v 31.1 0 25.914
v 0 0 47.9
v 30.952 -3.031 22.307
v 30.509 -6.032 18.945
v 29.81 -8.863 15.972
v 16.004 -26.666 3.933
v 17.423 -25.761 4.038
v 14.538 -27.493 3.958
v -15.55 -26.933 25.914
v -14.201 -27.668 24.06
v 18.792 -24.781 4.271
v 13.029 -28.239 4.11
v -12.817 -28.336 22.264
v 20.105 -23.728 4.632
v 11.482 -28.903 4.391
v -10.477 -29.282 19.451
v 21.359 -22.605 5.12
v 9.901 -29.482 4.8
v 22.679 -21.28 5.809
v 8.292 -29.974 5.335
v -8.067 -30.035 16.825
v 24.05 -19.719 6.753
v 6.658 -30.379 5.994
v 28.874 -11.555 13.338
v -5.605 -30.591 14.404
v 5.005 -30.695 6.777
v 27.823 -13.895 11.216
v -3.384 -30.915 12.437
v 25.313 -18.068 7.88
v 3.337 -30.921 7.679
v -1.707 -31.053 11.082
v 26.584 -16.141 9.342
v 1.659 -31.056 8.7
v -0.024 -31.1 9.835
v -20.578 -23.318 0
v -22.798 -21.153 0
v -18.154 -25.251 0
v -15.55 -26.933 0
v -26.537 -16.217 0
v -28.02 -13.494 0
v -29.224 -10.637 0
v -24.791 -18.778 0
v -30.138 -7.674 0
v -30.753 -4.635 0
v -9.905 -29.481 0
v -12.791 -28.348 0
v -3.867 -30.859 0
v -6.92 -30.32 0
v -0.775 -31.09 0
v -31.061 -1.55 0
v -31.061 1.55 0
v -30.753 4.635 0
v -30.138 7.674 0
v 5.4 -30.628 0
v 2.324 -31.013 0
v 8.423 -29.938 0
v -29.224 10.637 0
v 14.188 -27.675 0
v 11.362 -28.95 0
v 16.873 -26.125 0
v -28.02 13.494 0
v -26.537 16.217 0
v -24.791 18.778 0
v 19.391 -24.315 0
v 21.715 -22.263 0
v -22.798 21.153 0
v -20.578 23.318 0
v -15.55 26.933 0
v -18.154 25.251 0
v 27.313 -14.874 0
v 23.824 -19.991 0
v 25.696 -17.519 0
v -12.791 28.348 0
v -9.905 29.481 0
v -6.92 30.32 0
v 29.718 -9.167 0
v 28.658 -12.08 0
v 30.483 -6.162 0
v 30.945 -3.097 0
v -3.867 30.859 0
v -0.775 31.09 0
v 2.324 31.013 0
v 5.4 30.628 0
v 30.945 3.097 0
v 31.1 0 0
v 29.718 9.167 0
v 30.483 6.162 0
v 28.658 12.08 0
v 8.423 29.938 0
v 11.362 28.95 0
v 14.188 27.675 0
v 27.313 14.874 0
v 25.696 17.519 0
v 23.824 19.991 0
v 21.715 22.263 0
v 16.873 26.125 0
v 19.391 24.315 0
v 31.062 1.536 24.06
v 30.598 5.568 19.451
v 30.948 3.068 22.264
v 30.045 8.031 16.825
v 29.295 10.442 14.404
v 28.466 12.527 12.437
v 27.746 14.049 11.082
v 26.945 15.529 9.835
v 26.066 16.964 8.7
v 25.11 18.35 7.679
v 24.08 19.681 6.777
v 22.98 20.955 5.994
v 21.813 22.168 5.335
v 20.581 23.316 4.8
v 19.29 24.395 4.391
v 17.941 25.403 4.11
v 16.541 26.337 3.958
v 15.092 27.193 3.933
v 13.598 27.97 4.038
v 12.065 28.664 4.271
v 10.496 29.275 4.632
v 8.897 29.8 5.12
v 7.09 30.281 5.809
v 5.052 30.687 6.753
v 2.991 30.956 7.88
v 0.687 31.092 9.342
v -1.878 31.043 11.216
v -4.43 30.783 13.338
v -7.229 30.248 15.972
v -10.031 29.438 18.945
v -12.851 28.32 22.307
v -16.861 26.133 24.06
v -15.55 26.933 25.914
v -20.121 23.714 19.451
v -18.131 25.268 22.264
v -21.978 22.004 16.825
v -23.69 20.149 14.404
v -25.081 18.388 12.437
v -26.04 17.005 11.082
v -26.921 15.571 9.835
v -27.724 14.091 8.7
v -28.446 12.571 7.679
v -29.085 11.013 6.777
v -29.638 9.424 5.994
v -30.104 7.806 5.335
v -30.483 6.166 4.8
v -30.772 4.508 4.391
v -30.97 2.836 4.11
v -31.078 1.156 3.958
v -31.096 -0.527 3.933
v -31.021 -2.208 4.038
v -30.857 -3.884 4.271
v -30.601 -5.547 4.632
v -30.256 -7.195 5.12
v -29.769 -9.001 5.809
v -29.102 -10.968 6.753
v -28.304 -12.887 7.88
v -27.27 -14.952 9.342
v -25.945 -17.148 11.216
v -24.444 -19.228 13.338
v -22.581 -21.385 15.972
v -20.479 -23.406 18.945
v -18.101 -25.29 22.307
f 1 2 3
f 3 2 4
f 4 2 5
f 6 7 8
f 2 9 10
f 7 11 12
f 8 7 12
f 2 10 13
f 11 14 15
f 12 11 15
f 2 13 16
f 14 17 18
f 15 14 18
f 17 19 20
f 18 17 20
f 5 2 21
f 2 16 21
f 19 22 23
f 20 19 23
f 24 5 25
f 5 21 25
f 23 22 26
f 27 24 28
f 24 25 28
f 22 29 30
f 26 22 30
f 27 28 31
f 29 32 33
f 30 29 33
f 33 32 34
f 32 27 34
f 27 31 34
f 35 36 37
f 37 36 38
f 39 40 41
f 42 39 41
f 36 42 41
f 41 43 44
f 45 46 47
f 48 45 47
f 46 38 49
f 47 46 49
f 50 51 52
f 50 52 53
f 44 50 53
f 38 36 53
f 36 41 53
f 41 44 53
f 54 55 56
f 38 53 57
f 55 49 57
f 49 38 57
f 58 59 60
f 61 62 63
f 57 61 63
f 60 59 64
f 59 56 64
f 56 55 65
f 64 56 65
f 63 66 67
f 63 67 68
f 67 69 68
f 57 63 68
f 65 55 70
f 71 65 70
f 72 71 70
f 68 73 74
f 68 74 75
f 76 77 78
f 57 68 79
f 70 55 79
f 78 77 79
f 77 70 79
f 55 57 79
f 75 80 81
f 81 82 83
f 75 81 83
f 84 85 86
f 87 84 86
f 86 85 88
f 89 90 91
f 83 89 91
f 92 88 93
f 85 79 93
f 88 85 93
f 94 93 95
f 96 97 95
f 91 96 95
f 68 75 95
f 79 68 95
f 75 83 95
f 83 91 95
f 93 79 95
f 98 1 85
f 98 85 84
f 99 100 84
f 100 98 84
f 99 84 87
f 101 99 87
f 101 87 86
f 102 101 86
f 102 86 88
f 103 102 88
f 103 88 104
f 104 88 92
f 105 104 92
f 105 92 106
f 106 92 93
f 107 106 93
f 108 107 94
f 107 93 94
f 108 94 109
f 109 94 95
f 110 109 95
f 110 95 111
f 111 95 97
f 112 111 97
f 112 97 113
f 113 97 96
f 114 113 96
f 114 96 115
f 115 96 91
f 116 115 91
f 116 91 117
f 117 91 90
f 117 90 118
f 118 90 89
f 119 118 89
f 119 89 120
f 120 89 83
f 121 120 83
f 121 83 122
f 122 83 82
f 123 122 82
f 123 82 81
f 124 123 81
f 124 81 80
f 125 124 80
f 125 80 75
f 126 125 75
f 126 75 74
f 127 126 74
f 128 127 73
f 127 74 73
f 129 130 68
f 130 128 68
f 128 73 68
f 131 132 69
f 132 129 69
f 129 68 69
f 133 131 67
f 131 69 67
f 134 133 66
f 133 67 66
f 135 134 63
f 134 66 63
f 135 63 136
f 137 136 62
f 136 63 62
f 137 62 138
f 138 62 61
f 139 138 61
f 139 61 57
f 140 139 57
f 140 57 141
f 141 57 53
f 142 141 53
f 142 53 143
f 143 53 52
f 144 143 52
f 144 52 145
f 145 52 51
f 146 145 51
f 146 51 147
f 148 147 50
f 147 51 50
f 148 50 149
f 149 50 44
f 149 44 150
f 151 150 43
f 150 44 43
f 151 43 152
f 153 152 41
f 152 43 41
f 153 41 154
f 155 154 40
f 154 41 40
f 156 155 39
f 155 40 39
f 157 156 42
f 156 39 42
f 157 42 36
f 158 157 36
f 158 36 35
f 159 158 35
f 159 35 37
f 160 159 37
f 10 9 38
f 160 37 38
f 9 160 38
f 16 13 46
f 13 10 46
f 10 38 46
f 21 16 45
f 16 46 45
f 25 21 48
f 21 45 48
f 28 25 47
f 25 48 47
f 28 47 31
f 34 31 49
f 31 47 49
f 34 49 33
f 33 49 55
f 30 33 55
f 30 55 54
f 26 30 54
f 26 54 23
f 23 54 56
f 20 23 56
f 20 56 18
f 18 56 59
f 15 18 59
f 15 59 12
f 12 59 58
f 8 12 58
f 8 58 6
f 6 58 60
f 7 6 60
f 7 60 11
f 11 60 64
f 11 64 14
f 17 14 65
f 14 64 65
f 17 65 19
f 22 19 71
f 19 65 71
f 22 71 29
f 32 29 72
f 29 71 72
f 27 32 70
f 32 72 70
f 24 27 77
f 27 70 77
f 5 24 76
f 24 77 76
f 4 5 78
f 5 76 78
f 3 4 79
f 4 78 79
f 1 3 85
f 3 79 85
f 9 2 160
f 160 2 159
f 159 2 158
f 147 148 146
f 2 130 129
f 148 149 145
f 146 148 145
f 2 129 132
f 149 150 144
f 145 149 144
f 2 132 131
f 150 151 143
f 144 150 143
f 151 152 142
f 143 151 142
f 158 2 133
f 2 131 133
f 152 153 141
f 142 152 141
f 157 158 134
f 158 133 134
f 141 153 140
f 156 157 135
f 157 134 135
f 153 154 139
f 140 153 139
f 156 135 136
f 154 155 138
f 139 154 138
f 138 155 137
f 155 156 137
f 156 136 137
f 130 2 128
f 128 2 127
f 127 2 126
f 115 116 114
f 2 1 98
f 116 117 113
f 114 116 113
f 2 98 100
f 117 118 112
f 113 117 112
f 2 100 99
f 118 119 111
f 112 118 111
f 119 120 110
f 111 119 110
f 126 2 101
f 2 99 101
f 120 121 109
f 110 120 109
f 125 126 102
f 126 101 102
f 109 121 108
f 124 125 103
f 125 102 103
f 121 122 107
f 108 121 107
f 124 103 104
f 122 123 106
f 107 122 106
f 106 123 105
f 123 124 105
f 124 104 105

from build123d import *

# Parameters (mm, degrees)
SKETCH_1_R          = 31.1
EXTRUDE_1_DEPTH     = 47.9
CUT_EXTRUDE_1_DEPTH = 39.5
CUT_EXTRUDE_2_DEPTH = 62
CUT_EXTRUDE_3_DEPTH = 53.5


with BuildPart() as part:
    # 草图1 → 凸台-拉伸1 (new body)
    with BuildSketch(Plane.XY):
        Circle(SKETCH_1_R)
    extrude(amount=EXTRUDE_1_DEPTH)

    # 草图2 → 切除-拉伸1 (cut, symmetric)
    with BuildSketch(Plane(origin=(0, 0, 0), x_dir=(1, 0, 0), z_dir=(0, 1, 0))):
        Polygon((0, -47.9), (-40.690324156, 9.632856926), (-40.690324156, -56.656954578), (0, -56.656954578), align=None)
    extrude(amount=CUT_EXTRUDE_1_DEPTH, both=True, mode=Mode.SUBTRACT)

    # 草图4 → 切除-拉伸2 (cut, symmetric)
    with BuildSketch(Plane(origin=(0, 0, 0), x_dir=(0.5, 0.866025404, 0), z_dir=(0.866025404, -0.5, 0))):
        Polygon((0, 47.9), (100.699346514, -94.480804669), (100.699346514, 79.089205692), (0, 79.089205692), align=None)
    extrude(amount=CUT_EXTRUDE_2_DEPTH, both=True, mode=Mode.SUBTRACT)

    # 草图5 → 切除-拉伸3 (cut, symmetric)
    with BuildSketch(Plane(origin=(0, 0, 0), x_dir=(0.5, -0.866025404, 0), z_dir=(-0.866025404, -0.5, 0))):
        Polygon((0, 47.9), (45.690289371, -16.702406981), (45.690289371, 62.081252558), (2.684670532, 62.081252558), align=None)
    extrude(amount=CUT_EXTRUDE_3_DEPTH, both=True, mode=Mode.SUBTRACT)


solid = part.part
